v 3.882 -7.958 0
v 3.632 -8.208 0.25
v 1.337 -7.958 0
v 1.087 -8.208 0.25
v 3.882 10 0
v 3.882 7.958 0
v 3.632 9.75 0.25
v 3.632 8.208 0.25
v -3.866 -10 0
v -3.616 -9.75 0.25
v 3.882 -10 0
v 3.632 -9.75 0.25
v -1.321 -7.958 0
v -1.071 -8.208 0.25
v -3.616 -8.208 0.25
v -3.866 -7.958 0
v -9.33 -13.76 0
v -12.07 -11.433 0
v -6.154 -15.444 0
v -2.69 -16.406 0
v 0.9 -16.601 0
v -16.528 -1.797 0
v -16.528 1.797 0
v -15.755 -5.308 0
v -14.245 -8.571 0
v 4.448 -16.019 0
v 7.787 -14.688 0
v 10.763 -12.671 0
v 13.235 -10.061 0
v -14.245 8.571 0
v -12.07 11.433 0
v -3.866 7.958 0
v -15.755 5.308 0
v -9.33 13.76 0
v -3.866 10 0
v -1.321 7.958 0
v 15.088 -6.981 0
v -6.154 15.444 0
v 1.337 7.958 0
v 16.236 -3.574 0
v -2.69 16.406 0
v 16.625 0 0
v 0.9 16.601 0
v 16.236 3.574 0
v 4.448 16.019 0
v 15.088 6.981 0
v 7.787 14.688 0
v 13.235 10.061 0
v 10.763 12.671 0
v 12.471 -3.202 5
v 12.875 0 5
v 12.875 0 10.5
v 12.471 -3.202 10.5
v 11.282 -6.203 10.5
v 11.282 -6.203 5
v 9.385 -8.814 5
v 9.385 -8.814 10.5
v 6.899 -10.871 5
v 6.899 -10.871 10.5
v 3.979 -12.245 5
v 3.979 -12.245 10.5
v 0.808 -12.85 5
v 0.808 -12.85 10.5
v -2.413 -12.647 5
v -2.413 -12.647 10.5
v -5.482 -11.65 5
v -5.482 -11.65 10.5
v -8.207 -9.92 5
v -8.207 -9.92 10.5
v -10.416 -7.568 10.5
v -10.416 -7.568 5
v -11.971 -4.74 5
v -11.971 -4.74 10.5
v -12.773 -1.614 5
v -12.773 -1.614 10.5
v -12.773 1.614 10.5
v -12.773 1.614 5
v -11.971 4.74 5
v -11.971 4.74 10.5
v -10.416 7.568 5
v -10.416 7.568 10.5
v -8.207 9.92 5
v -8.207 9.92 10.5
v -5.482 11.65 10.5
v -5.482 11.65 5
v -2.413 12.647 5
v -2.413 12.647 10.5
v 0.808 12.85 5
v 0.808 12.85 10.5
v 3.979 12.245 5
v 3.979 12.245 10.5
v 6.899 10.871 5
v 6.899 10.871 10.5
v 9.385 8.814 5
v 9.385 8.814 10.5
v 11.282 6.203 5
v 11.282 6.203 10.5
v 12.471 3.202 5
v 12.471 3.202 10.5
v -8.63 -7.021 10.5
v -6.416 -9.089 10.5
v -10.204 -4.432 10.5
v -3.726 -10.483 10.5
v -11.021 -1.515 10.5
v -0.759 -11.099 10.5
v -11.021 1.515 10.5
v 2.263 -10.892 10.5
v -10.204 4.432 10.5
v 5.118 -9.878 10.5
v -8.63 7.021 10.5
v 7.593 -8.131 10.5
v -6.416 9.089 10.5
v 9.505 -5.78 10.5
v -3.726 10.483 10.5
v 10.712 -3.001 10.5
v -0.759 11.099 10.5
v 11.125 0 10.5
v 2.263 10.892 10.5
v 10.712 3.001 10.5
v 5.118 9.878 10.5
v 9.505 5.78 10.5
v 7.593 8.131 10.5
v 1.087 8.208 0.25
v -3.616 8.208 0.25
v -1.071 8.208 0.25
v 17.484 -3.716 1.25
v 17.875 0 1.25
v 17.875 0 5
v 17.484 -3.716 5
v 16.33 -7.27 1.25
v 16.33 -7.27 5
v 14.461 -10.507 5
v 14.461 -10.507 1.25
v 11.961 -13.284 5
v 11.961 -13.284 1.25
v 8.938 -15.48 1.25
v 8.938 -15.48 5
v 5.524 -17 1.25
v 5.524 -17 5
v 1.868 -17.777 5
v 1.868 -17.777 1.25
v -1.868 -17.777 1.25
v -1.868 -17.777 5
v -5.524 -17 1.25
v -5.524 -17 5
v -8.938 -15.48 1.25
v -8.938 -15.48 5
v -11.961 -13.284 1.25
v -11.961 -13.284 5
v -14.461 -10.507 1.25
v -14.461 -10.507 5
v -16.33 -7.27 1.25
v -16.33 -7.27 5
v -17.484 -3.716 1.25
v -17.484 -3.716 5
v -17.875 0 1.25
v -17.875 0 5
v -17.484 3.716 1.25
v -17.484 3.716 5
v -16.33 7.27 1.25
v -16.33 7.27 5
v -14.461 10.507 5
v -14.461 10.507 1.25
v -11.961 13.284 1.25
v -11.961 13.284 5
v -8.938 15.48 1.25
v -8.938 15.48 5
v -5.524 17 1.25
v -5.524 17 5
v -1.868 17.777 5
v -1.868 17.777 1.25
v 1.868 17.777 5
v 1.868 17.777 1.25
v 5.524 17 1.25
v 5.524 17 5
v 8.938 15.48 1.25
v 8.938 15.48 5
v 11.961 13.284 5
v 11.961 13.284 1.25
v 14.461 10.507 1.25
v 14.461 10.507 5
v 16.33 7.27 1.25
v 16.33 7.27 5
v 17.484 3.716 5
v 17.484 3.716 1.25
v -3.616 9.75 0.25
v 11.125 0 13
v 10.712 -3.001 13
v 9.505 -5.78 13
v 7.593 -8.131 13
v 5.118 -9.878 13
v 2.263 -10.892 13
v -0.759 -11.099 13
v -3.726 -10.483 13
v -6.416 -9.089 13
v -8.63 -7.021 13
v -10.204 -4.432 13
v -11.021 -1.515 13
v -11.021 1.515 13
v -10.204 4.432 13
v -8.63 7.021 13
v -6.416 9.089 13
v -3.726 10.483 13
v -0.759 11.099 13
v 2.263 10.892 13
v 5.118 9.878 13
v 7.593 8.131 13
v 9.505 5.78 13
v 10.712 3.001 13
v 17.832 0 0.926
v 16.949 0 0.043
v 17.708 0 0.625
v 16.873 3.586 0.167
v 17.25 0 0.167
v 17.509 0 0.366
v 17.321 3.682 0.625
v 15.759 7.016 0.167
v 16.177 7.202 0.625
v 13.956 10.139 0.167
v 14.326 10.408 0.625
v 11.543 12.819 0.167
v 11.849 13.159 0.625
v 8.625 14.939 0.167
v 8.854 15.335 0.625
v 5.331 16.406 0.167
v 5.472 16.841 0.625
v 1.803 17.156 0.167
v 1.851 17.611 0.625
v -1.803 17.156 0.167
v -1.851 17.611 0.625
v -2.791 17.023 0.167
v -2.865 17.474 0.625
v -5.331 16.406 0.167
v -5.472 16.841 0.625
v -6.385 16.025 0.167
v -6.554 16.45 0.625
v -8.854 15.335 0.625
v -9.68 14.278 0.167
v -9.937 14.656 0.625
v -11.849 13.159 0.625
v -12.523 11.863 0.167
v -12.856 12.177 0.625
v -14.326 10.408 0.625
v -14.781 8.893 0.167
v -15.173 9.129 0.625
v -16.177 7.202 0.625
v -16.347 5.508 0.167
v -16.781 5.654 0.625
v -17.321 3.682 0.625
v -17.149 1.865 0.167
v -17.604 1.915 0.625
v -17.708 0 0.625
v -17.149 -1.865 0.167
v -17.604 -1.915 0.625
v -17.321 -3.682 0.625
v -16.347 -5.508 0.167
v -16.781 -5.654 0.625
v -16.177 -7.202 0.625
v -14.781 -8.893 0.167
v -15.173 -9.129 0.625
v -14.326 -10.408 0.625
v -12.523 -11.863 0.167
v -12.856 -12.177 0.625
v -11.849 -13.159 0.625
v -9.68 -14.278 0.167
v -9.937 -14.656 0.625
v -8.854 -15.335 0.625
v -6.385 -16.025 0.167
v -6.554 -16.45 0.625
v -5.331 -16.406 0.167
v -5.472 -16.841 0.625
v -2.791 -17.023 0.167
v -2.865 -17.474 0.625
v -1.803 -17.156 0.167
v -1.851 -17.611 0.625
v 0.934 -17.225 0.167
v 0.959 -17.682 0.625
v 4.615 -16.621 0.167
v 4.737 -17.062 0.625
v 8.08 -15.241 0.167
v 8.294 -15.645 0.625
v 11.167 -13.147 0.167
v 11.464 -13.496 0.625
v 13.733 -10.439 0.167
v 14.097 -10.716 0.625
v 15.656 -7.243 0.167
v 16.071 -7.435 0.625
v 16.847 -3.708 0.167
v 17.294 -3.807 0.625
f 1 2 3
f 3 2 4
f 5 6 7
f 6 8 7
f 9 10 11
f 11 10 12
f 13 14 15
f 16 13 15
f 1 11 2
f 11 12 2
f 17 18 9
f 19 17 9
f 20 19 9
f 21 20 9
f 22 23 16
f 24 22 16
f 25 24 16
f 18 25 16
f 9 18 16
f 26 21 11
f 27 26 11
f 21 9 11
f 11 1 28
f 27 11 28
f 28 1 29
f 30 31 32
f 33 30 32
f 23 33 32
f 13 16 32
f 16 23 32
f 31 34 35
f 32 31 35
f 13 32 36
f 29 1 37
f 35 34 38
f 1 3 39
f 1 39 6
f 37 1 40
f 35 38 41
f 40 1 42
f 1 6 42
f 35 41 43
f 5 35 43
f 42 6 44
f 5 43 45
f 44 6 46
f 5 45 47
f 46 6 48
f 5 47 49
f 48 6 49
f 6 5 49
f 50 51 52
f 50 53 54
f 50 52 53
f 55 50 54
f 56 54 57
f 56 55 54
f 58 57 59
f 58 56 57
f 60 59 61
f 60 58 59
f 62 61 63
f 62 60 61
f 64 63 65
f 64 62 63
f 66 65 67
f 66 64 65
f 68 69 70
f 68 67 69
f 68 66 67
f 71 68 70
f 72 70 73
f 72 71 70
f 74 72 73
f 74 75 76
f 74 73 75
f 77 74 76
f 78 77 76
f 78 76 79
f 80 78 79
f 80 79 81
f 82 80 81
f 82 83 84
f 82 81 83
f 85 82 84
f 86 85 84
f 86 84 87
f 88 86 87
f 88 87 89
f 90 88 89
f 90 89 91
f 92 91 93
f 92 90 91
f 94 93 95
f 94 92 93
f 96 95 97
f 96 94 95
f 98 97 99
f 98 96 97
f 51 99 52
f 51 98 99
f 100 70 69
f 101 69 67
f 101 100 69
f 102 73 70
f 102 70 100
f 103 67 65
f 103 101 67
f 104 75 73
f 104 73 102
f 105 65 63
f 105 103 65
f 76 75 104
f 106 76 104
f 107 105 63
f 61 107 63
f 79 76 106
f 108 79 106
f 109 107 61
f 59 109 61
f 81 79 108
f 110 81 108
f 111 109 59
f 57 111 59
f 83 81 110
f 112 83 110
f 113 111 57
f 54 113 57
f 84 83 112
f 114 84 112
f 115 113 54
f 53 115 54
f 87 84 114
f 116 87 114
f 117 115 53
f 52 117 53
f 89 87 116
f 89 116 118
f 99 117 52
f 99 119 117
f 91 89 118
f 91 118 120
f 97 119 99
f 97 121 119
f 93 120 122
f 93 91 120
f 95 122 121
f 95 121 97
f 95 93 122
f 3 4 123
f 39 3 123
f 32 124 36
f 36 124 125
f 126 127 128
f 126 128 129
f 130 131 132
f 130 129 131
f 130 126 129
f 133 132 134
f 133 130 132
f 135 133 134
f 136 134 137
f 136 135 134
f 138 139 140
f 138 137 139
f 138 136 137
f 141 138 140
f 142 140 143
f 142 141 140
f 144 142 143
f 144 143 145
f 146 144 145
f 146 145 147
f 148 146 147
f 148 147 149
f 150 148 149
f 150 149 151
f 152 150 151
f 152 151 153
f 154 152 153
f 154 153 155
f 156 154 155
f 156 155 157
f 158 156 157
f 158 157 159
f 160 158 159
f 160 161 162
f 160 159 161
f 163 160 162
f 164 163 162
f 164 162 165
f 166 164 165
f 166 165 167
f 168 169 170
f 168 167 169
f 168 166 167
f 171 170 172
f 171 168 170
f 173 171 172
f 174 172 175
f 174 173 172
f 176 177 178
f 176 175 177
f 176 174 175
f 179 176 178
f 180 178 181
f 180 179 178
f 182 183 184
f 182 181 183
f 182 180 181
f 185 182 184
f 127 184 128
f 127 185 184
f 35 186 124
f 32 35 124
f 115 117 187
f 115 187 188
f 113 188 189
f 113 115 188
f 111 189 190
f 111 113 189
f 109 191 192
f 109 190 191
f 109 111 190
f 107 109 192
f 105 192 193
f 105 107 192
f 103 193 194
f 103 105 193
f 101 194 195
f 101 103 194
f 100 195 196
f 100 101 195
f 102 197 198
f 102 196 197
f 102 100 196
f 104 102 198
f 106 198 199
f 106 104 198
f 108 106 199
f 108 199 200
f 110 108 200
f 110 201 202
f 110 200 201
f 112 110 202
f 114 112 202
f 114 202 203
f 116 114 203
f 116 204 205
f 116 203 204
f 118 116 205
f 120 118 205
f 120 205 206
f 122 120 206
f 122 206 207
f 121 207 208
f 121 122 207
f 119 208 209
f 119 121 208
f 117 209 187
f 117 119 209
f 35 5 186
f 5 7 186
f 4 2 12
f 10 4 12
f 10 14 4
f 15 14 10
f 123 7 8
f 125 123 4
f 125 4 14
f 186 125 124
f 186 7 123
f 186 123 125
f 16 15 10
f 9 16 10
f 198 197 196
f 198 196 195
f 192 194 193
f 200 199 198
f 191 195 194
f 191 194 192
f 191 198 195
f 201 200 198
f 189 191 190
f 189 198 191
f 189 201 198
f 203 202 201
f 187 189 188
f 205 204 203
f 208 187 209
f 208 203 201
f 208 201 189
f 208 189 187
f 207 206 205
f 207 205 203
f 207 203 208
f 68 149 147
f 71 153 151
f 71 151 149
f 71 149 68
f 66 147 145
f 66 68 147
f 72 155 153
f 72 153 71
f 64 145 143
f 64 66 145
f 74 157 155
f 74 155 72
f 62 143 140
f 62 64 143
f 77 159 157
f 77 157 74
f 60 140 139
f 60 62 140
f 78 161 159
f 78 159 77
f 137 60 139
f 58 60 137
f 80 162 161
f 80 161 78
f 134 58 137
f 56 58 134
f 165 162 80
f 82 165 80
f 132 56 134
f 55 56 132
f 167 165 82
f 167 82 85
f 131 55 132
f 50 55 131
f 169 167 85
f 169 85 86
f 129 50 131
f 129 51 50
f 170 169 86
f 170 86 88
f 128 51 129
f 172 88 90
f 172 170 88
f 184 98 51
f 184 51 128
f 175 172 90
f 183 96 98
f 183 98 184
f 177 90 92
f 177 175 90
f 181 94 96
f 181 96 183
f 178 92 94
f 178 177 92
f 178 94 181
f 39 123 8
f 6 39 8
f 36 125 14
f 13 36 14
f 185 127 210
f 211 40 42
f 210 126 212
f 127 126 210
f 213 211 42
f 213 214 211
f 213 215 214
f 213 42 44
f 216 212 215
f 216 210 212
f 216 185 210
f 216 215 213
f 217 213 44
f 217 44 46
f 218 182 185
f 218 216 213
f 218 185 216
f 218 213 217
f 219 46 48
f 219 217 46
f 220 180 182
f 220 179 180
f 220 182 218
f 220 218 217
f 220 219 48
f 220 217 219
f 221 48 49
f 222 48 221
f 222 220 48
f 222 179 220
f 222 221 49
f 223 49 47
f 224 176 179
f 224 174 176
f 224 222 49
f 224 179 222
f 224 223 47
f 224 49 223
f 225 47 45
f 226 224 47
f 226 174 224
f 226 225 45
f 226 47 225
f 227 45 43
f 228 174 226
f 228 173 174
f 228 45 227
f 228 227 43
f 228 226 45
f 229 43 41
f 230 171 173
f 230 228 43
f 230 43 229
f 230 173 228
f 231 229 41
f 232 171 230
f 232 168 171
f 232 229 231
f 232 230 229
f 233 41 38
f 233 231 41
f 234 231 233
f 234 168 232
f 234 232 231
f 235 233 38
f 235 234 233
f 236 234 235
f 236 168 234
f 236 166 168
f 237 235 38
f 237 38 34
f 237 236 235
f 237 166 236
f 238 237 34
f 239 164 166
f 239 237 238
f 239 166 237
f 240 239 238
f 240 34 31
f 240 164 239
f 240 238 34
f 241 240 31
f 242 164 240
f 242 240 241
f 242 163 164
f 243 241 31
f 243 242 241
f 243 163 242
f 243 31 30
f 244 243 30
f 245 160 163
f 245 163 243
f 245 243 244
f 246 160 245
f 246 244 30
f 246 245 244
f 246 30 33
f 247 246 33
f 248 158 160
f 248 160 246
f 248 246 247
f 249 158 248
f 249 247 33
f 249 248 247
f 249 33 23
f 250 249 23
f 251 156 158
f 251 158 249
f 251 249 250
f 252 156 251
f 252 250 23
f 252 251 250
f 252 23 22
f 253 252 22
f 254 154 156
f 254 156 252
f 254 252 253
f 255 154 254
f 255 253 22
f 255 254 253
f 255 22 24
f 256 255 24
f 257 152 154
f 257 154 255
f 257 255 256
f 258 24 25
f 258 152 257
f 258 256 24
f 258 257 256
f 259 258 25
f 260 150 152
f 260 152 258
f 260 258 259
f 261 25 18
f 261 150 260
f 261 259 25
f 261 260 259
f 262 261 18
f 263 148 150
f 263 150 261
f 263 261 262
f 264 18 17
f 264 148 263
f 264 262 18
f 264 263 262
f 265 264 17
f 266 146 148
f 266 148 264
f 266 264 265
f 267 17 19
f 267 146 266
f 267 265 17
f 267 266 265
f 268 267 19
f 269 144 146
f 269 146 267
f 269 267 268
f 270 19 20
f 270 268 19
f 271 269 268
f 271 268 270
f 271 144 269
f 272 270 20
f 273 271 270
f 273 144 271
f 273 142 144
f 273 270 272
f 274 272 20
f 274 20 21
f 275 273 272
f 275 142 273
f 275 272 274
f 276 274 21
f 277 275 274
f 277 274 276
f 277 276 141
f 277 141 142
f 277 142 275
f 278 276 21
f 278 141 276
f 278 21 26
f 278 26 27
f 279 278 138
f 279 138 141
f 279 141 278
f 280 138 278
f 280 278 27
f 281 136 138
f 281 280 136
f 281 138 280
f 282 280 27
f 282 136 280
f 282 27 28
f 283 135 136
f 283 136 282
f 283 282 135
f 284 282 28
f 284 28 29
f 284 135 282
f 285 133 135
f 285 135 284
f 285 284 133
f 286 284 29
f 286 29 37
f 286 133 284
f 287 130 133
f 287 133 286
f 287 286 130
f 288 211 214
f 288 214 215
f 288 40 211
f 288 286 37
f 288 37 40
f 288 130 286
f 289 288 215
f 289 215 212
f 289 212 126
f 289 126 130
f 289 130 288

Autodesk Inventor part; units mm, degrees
ref_plane "YZ Plane" through (0, 0, 0) normal (1, 0, 0) x (0, 1, 0)
ref_plane "XZ Plane" through (0, 0, 0) normal (0, 1, 0) x (-1, 0, 0)
ref_plane "XY Plane" through (0, 0, 0) normal (0, 0, 1) x (1, 0, 0)
sketch "Sketch1" plane through (0, 0, 0) normal (0, 0, 1) x (1, 0, 0)
  circle A0 centre (0, 0) radius 11.125
  circle A1 centre (0, 0) radius 12.875
  circle A2 centre (0, 0) radius 17.875
  dimension "d0" = 22.25
  dimension "d1" = 25.75
  dimension "d2" = 5
extrude "Extrusion1" add sketch "Sketch1" along normal blind 5 contours A0 | A1 | A2
extrude "Extrusion2" add sketch "Sketch1" along normal blind 5.5 from surface at 5 contours A0 | A1
extrude "Extrusion3" add sketch "Sketch1" along normal blind 2.5 from surface at 10.5 contours A0
fillet "Fillet1" radius 1.25 1 edges at (-17.875, 0, 0)
sketch "Sketch2" plane through (0, 0, 0) normal (0, 0, -1) x (-1, 0, 0)
  line L0 (-12.5, -12.5) -> (12.5, -12.5)
  line L1 (12.5, -12.5) -> (12.5, 12.5)
  line L2 (12.5, 12.5) -> (-12.5, 12.5)
  line L3 (-12.5, 12.5) -> (-12.5, -12.5)
  line L4 (-12.5, -12.5) -> (12.5, 12.5) construction
  line L5 (12.5, -12.5) -> (-12.5, 12.5) construction
  line L6 (-12.5, 12.5) -> (12.5, 12.5) construction
  line L7 (12.5, 12.5) -> (12.5, -12.5) construction
  line L8 (12.5, -12.5) -> (-12.5, -12.5) construction
  line L9 (-12.5, -12.5) -> (-12.5, 12.5) construction
  line L10 (3.8655, -10) -> (-3.8817, -10)
  line L11 (-3.8817, -10) -> (-3.8817, -7.9579)
  line L12 (-3.8817, -7.9579) -> (-1.3371, -7.9579)
  line L13 (-1.3371, -7.9579) -> (-1.3371, 7.9579)
  line L14 (-1.3371, 7.9579) -> (-3.8817, 7.9579)
  line L15 (-3.8817, 7.9579) -> (-3.8817, 10)
  line L16 (-3.8817, 10) -> (3.8655, 10)
  line L17 (3.8655, 10) -> (3.8655, 7.9579)
  line L18 (3.8655, 7.9579) -> (1.3209, 7.9579)
  line L19 (1.3209, 7.9579) -> (1.3209, -7.9579)
  line L20 (1.3209, -7.9579) -> (3.8655, -7.9579)
  line L21 (3.8655, -7.9579) -> (3.8655, -10)
  point P0 (0, 0)
  dimension "d10" = 25
  dimension "d11" = 25
extrude "Extrusion4" cut sketch "Sketch2" against normal blind 0.25 contours L10 L11 L12 L13 L14 L15 L16 L17 L18 L19 L20 L21
chamfer "Chamfer1" distance 0.25 angle 45 12 edges at (0.0081, -10, 0.25) (3.8817, -8.9789, 0.25) (2.6094, -7.9579, 0.25) (1.3371, 0, 0.25) (2.6094, 7.9579, 0.25) (3.8817, 8.9789, 0.25) (0.0081, 10, 0.25) (-3.8655, 8.9789, 0.25) (-2.5932, 7.9579, 0.25) (-1.3209, 0, 0.25) (-2.5932, -7.9579, 0.25) (-3.8655, -8.9789, 0.25)
properties part number "Inner Ring Press"
